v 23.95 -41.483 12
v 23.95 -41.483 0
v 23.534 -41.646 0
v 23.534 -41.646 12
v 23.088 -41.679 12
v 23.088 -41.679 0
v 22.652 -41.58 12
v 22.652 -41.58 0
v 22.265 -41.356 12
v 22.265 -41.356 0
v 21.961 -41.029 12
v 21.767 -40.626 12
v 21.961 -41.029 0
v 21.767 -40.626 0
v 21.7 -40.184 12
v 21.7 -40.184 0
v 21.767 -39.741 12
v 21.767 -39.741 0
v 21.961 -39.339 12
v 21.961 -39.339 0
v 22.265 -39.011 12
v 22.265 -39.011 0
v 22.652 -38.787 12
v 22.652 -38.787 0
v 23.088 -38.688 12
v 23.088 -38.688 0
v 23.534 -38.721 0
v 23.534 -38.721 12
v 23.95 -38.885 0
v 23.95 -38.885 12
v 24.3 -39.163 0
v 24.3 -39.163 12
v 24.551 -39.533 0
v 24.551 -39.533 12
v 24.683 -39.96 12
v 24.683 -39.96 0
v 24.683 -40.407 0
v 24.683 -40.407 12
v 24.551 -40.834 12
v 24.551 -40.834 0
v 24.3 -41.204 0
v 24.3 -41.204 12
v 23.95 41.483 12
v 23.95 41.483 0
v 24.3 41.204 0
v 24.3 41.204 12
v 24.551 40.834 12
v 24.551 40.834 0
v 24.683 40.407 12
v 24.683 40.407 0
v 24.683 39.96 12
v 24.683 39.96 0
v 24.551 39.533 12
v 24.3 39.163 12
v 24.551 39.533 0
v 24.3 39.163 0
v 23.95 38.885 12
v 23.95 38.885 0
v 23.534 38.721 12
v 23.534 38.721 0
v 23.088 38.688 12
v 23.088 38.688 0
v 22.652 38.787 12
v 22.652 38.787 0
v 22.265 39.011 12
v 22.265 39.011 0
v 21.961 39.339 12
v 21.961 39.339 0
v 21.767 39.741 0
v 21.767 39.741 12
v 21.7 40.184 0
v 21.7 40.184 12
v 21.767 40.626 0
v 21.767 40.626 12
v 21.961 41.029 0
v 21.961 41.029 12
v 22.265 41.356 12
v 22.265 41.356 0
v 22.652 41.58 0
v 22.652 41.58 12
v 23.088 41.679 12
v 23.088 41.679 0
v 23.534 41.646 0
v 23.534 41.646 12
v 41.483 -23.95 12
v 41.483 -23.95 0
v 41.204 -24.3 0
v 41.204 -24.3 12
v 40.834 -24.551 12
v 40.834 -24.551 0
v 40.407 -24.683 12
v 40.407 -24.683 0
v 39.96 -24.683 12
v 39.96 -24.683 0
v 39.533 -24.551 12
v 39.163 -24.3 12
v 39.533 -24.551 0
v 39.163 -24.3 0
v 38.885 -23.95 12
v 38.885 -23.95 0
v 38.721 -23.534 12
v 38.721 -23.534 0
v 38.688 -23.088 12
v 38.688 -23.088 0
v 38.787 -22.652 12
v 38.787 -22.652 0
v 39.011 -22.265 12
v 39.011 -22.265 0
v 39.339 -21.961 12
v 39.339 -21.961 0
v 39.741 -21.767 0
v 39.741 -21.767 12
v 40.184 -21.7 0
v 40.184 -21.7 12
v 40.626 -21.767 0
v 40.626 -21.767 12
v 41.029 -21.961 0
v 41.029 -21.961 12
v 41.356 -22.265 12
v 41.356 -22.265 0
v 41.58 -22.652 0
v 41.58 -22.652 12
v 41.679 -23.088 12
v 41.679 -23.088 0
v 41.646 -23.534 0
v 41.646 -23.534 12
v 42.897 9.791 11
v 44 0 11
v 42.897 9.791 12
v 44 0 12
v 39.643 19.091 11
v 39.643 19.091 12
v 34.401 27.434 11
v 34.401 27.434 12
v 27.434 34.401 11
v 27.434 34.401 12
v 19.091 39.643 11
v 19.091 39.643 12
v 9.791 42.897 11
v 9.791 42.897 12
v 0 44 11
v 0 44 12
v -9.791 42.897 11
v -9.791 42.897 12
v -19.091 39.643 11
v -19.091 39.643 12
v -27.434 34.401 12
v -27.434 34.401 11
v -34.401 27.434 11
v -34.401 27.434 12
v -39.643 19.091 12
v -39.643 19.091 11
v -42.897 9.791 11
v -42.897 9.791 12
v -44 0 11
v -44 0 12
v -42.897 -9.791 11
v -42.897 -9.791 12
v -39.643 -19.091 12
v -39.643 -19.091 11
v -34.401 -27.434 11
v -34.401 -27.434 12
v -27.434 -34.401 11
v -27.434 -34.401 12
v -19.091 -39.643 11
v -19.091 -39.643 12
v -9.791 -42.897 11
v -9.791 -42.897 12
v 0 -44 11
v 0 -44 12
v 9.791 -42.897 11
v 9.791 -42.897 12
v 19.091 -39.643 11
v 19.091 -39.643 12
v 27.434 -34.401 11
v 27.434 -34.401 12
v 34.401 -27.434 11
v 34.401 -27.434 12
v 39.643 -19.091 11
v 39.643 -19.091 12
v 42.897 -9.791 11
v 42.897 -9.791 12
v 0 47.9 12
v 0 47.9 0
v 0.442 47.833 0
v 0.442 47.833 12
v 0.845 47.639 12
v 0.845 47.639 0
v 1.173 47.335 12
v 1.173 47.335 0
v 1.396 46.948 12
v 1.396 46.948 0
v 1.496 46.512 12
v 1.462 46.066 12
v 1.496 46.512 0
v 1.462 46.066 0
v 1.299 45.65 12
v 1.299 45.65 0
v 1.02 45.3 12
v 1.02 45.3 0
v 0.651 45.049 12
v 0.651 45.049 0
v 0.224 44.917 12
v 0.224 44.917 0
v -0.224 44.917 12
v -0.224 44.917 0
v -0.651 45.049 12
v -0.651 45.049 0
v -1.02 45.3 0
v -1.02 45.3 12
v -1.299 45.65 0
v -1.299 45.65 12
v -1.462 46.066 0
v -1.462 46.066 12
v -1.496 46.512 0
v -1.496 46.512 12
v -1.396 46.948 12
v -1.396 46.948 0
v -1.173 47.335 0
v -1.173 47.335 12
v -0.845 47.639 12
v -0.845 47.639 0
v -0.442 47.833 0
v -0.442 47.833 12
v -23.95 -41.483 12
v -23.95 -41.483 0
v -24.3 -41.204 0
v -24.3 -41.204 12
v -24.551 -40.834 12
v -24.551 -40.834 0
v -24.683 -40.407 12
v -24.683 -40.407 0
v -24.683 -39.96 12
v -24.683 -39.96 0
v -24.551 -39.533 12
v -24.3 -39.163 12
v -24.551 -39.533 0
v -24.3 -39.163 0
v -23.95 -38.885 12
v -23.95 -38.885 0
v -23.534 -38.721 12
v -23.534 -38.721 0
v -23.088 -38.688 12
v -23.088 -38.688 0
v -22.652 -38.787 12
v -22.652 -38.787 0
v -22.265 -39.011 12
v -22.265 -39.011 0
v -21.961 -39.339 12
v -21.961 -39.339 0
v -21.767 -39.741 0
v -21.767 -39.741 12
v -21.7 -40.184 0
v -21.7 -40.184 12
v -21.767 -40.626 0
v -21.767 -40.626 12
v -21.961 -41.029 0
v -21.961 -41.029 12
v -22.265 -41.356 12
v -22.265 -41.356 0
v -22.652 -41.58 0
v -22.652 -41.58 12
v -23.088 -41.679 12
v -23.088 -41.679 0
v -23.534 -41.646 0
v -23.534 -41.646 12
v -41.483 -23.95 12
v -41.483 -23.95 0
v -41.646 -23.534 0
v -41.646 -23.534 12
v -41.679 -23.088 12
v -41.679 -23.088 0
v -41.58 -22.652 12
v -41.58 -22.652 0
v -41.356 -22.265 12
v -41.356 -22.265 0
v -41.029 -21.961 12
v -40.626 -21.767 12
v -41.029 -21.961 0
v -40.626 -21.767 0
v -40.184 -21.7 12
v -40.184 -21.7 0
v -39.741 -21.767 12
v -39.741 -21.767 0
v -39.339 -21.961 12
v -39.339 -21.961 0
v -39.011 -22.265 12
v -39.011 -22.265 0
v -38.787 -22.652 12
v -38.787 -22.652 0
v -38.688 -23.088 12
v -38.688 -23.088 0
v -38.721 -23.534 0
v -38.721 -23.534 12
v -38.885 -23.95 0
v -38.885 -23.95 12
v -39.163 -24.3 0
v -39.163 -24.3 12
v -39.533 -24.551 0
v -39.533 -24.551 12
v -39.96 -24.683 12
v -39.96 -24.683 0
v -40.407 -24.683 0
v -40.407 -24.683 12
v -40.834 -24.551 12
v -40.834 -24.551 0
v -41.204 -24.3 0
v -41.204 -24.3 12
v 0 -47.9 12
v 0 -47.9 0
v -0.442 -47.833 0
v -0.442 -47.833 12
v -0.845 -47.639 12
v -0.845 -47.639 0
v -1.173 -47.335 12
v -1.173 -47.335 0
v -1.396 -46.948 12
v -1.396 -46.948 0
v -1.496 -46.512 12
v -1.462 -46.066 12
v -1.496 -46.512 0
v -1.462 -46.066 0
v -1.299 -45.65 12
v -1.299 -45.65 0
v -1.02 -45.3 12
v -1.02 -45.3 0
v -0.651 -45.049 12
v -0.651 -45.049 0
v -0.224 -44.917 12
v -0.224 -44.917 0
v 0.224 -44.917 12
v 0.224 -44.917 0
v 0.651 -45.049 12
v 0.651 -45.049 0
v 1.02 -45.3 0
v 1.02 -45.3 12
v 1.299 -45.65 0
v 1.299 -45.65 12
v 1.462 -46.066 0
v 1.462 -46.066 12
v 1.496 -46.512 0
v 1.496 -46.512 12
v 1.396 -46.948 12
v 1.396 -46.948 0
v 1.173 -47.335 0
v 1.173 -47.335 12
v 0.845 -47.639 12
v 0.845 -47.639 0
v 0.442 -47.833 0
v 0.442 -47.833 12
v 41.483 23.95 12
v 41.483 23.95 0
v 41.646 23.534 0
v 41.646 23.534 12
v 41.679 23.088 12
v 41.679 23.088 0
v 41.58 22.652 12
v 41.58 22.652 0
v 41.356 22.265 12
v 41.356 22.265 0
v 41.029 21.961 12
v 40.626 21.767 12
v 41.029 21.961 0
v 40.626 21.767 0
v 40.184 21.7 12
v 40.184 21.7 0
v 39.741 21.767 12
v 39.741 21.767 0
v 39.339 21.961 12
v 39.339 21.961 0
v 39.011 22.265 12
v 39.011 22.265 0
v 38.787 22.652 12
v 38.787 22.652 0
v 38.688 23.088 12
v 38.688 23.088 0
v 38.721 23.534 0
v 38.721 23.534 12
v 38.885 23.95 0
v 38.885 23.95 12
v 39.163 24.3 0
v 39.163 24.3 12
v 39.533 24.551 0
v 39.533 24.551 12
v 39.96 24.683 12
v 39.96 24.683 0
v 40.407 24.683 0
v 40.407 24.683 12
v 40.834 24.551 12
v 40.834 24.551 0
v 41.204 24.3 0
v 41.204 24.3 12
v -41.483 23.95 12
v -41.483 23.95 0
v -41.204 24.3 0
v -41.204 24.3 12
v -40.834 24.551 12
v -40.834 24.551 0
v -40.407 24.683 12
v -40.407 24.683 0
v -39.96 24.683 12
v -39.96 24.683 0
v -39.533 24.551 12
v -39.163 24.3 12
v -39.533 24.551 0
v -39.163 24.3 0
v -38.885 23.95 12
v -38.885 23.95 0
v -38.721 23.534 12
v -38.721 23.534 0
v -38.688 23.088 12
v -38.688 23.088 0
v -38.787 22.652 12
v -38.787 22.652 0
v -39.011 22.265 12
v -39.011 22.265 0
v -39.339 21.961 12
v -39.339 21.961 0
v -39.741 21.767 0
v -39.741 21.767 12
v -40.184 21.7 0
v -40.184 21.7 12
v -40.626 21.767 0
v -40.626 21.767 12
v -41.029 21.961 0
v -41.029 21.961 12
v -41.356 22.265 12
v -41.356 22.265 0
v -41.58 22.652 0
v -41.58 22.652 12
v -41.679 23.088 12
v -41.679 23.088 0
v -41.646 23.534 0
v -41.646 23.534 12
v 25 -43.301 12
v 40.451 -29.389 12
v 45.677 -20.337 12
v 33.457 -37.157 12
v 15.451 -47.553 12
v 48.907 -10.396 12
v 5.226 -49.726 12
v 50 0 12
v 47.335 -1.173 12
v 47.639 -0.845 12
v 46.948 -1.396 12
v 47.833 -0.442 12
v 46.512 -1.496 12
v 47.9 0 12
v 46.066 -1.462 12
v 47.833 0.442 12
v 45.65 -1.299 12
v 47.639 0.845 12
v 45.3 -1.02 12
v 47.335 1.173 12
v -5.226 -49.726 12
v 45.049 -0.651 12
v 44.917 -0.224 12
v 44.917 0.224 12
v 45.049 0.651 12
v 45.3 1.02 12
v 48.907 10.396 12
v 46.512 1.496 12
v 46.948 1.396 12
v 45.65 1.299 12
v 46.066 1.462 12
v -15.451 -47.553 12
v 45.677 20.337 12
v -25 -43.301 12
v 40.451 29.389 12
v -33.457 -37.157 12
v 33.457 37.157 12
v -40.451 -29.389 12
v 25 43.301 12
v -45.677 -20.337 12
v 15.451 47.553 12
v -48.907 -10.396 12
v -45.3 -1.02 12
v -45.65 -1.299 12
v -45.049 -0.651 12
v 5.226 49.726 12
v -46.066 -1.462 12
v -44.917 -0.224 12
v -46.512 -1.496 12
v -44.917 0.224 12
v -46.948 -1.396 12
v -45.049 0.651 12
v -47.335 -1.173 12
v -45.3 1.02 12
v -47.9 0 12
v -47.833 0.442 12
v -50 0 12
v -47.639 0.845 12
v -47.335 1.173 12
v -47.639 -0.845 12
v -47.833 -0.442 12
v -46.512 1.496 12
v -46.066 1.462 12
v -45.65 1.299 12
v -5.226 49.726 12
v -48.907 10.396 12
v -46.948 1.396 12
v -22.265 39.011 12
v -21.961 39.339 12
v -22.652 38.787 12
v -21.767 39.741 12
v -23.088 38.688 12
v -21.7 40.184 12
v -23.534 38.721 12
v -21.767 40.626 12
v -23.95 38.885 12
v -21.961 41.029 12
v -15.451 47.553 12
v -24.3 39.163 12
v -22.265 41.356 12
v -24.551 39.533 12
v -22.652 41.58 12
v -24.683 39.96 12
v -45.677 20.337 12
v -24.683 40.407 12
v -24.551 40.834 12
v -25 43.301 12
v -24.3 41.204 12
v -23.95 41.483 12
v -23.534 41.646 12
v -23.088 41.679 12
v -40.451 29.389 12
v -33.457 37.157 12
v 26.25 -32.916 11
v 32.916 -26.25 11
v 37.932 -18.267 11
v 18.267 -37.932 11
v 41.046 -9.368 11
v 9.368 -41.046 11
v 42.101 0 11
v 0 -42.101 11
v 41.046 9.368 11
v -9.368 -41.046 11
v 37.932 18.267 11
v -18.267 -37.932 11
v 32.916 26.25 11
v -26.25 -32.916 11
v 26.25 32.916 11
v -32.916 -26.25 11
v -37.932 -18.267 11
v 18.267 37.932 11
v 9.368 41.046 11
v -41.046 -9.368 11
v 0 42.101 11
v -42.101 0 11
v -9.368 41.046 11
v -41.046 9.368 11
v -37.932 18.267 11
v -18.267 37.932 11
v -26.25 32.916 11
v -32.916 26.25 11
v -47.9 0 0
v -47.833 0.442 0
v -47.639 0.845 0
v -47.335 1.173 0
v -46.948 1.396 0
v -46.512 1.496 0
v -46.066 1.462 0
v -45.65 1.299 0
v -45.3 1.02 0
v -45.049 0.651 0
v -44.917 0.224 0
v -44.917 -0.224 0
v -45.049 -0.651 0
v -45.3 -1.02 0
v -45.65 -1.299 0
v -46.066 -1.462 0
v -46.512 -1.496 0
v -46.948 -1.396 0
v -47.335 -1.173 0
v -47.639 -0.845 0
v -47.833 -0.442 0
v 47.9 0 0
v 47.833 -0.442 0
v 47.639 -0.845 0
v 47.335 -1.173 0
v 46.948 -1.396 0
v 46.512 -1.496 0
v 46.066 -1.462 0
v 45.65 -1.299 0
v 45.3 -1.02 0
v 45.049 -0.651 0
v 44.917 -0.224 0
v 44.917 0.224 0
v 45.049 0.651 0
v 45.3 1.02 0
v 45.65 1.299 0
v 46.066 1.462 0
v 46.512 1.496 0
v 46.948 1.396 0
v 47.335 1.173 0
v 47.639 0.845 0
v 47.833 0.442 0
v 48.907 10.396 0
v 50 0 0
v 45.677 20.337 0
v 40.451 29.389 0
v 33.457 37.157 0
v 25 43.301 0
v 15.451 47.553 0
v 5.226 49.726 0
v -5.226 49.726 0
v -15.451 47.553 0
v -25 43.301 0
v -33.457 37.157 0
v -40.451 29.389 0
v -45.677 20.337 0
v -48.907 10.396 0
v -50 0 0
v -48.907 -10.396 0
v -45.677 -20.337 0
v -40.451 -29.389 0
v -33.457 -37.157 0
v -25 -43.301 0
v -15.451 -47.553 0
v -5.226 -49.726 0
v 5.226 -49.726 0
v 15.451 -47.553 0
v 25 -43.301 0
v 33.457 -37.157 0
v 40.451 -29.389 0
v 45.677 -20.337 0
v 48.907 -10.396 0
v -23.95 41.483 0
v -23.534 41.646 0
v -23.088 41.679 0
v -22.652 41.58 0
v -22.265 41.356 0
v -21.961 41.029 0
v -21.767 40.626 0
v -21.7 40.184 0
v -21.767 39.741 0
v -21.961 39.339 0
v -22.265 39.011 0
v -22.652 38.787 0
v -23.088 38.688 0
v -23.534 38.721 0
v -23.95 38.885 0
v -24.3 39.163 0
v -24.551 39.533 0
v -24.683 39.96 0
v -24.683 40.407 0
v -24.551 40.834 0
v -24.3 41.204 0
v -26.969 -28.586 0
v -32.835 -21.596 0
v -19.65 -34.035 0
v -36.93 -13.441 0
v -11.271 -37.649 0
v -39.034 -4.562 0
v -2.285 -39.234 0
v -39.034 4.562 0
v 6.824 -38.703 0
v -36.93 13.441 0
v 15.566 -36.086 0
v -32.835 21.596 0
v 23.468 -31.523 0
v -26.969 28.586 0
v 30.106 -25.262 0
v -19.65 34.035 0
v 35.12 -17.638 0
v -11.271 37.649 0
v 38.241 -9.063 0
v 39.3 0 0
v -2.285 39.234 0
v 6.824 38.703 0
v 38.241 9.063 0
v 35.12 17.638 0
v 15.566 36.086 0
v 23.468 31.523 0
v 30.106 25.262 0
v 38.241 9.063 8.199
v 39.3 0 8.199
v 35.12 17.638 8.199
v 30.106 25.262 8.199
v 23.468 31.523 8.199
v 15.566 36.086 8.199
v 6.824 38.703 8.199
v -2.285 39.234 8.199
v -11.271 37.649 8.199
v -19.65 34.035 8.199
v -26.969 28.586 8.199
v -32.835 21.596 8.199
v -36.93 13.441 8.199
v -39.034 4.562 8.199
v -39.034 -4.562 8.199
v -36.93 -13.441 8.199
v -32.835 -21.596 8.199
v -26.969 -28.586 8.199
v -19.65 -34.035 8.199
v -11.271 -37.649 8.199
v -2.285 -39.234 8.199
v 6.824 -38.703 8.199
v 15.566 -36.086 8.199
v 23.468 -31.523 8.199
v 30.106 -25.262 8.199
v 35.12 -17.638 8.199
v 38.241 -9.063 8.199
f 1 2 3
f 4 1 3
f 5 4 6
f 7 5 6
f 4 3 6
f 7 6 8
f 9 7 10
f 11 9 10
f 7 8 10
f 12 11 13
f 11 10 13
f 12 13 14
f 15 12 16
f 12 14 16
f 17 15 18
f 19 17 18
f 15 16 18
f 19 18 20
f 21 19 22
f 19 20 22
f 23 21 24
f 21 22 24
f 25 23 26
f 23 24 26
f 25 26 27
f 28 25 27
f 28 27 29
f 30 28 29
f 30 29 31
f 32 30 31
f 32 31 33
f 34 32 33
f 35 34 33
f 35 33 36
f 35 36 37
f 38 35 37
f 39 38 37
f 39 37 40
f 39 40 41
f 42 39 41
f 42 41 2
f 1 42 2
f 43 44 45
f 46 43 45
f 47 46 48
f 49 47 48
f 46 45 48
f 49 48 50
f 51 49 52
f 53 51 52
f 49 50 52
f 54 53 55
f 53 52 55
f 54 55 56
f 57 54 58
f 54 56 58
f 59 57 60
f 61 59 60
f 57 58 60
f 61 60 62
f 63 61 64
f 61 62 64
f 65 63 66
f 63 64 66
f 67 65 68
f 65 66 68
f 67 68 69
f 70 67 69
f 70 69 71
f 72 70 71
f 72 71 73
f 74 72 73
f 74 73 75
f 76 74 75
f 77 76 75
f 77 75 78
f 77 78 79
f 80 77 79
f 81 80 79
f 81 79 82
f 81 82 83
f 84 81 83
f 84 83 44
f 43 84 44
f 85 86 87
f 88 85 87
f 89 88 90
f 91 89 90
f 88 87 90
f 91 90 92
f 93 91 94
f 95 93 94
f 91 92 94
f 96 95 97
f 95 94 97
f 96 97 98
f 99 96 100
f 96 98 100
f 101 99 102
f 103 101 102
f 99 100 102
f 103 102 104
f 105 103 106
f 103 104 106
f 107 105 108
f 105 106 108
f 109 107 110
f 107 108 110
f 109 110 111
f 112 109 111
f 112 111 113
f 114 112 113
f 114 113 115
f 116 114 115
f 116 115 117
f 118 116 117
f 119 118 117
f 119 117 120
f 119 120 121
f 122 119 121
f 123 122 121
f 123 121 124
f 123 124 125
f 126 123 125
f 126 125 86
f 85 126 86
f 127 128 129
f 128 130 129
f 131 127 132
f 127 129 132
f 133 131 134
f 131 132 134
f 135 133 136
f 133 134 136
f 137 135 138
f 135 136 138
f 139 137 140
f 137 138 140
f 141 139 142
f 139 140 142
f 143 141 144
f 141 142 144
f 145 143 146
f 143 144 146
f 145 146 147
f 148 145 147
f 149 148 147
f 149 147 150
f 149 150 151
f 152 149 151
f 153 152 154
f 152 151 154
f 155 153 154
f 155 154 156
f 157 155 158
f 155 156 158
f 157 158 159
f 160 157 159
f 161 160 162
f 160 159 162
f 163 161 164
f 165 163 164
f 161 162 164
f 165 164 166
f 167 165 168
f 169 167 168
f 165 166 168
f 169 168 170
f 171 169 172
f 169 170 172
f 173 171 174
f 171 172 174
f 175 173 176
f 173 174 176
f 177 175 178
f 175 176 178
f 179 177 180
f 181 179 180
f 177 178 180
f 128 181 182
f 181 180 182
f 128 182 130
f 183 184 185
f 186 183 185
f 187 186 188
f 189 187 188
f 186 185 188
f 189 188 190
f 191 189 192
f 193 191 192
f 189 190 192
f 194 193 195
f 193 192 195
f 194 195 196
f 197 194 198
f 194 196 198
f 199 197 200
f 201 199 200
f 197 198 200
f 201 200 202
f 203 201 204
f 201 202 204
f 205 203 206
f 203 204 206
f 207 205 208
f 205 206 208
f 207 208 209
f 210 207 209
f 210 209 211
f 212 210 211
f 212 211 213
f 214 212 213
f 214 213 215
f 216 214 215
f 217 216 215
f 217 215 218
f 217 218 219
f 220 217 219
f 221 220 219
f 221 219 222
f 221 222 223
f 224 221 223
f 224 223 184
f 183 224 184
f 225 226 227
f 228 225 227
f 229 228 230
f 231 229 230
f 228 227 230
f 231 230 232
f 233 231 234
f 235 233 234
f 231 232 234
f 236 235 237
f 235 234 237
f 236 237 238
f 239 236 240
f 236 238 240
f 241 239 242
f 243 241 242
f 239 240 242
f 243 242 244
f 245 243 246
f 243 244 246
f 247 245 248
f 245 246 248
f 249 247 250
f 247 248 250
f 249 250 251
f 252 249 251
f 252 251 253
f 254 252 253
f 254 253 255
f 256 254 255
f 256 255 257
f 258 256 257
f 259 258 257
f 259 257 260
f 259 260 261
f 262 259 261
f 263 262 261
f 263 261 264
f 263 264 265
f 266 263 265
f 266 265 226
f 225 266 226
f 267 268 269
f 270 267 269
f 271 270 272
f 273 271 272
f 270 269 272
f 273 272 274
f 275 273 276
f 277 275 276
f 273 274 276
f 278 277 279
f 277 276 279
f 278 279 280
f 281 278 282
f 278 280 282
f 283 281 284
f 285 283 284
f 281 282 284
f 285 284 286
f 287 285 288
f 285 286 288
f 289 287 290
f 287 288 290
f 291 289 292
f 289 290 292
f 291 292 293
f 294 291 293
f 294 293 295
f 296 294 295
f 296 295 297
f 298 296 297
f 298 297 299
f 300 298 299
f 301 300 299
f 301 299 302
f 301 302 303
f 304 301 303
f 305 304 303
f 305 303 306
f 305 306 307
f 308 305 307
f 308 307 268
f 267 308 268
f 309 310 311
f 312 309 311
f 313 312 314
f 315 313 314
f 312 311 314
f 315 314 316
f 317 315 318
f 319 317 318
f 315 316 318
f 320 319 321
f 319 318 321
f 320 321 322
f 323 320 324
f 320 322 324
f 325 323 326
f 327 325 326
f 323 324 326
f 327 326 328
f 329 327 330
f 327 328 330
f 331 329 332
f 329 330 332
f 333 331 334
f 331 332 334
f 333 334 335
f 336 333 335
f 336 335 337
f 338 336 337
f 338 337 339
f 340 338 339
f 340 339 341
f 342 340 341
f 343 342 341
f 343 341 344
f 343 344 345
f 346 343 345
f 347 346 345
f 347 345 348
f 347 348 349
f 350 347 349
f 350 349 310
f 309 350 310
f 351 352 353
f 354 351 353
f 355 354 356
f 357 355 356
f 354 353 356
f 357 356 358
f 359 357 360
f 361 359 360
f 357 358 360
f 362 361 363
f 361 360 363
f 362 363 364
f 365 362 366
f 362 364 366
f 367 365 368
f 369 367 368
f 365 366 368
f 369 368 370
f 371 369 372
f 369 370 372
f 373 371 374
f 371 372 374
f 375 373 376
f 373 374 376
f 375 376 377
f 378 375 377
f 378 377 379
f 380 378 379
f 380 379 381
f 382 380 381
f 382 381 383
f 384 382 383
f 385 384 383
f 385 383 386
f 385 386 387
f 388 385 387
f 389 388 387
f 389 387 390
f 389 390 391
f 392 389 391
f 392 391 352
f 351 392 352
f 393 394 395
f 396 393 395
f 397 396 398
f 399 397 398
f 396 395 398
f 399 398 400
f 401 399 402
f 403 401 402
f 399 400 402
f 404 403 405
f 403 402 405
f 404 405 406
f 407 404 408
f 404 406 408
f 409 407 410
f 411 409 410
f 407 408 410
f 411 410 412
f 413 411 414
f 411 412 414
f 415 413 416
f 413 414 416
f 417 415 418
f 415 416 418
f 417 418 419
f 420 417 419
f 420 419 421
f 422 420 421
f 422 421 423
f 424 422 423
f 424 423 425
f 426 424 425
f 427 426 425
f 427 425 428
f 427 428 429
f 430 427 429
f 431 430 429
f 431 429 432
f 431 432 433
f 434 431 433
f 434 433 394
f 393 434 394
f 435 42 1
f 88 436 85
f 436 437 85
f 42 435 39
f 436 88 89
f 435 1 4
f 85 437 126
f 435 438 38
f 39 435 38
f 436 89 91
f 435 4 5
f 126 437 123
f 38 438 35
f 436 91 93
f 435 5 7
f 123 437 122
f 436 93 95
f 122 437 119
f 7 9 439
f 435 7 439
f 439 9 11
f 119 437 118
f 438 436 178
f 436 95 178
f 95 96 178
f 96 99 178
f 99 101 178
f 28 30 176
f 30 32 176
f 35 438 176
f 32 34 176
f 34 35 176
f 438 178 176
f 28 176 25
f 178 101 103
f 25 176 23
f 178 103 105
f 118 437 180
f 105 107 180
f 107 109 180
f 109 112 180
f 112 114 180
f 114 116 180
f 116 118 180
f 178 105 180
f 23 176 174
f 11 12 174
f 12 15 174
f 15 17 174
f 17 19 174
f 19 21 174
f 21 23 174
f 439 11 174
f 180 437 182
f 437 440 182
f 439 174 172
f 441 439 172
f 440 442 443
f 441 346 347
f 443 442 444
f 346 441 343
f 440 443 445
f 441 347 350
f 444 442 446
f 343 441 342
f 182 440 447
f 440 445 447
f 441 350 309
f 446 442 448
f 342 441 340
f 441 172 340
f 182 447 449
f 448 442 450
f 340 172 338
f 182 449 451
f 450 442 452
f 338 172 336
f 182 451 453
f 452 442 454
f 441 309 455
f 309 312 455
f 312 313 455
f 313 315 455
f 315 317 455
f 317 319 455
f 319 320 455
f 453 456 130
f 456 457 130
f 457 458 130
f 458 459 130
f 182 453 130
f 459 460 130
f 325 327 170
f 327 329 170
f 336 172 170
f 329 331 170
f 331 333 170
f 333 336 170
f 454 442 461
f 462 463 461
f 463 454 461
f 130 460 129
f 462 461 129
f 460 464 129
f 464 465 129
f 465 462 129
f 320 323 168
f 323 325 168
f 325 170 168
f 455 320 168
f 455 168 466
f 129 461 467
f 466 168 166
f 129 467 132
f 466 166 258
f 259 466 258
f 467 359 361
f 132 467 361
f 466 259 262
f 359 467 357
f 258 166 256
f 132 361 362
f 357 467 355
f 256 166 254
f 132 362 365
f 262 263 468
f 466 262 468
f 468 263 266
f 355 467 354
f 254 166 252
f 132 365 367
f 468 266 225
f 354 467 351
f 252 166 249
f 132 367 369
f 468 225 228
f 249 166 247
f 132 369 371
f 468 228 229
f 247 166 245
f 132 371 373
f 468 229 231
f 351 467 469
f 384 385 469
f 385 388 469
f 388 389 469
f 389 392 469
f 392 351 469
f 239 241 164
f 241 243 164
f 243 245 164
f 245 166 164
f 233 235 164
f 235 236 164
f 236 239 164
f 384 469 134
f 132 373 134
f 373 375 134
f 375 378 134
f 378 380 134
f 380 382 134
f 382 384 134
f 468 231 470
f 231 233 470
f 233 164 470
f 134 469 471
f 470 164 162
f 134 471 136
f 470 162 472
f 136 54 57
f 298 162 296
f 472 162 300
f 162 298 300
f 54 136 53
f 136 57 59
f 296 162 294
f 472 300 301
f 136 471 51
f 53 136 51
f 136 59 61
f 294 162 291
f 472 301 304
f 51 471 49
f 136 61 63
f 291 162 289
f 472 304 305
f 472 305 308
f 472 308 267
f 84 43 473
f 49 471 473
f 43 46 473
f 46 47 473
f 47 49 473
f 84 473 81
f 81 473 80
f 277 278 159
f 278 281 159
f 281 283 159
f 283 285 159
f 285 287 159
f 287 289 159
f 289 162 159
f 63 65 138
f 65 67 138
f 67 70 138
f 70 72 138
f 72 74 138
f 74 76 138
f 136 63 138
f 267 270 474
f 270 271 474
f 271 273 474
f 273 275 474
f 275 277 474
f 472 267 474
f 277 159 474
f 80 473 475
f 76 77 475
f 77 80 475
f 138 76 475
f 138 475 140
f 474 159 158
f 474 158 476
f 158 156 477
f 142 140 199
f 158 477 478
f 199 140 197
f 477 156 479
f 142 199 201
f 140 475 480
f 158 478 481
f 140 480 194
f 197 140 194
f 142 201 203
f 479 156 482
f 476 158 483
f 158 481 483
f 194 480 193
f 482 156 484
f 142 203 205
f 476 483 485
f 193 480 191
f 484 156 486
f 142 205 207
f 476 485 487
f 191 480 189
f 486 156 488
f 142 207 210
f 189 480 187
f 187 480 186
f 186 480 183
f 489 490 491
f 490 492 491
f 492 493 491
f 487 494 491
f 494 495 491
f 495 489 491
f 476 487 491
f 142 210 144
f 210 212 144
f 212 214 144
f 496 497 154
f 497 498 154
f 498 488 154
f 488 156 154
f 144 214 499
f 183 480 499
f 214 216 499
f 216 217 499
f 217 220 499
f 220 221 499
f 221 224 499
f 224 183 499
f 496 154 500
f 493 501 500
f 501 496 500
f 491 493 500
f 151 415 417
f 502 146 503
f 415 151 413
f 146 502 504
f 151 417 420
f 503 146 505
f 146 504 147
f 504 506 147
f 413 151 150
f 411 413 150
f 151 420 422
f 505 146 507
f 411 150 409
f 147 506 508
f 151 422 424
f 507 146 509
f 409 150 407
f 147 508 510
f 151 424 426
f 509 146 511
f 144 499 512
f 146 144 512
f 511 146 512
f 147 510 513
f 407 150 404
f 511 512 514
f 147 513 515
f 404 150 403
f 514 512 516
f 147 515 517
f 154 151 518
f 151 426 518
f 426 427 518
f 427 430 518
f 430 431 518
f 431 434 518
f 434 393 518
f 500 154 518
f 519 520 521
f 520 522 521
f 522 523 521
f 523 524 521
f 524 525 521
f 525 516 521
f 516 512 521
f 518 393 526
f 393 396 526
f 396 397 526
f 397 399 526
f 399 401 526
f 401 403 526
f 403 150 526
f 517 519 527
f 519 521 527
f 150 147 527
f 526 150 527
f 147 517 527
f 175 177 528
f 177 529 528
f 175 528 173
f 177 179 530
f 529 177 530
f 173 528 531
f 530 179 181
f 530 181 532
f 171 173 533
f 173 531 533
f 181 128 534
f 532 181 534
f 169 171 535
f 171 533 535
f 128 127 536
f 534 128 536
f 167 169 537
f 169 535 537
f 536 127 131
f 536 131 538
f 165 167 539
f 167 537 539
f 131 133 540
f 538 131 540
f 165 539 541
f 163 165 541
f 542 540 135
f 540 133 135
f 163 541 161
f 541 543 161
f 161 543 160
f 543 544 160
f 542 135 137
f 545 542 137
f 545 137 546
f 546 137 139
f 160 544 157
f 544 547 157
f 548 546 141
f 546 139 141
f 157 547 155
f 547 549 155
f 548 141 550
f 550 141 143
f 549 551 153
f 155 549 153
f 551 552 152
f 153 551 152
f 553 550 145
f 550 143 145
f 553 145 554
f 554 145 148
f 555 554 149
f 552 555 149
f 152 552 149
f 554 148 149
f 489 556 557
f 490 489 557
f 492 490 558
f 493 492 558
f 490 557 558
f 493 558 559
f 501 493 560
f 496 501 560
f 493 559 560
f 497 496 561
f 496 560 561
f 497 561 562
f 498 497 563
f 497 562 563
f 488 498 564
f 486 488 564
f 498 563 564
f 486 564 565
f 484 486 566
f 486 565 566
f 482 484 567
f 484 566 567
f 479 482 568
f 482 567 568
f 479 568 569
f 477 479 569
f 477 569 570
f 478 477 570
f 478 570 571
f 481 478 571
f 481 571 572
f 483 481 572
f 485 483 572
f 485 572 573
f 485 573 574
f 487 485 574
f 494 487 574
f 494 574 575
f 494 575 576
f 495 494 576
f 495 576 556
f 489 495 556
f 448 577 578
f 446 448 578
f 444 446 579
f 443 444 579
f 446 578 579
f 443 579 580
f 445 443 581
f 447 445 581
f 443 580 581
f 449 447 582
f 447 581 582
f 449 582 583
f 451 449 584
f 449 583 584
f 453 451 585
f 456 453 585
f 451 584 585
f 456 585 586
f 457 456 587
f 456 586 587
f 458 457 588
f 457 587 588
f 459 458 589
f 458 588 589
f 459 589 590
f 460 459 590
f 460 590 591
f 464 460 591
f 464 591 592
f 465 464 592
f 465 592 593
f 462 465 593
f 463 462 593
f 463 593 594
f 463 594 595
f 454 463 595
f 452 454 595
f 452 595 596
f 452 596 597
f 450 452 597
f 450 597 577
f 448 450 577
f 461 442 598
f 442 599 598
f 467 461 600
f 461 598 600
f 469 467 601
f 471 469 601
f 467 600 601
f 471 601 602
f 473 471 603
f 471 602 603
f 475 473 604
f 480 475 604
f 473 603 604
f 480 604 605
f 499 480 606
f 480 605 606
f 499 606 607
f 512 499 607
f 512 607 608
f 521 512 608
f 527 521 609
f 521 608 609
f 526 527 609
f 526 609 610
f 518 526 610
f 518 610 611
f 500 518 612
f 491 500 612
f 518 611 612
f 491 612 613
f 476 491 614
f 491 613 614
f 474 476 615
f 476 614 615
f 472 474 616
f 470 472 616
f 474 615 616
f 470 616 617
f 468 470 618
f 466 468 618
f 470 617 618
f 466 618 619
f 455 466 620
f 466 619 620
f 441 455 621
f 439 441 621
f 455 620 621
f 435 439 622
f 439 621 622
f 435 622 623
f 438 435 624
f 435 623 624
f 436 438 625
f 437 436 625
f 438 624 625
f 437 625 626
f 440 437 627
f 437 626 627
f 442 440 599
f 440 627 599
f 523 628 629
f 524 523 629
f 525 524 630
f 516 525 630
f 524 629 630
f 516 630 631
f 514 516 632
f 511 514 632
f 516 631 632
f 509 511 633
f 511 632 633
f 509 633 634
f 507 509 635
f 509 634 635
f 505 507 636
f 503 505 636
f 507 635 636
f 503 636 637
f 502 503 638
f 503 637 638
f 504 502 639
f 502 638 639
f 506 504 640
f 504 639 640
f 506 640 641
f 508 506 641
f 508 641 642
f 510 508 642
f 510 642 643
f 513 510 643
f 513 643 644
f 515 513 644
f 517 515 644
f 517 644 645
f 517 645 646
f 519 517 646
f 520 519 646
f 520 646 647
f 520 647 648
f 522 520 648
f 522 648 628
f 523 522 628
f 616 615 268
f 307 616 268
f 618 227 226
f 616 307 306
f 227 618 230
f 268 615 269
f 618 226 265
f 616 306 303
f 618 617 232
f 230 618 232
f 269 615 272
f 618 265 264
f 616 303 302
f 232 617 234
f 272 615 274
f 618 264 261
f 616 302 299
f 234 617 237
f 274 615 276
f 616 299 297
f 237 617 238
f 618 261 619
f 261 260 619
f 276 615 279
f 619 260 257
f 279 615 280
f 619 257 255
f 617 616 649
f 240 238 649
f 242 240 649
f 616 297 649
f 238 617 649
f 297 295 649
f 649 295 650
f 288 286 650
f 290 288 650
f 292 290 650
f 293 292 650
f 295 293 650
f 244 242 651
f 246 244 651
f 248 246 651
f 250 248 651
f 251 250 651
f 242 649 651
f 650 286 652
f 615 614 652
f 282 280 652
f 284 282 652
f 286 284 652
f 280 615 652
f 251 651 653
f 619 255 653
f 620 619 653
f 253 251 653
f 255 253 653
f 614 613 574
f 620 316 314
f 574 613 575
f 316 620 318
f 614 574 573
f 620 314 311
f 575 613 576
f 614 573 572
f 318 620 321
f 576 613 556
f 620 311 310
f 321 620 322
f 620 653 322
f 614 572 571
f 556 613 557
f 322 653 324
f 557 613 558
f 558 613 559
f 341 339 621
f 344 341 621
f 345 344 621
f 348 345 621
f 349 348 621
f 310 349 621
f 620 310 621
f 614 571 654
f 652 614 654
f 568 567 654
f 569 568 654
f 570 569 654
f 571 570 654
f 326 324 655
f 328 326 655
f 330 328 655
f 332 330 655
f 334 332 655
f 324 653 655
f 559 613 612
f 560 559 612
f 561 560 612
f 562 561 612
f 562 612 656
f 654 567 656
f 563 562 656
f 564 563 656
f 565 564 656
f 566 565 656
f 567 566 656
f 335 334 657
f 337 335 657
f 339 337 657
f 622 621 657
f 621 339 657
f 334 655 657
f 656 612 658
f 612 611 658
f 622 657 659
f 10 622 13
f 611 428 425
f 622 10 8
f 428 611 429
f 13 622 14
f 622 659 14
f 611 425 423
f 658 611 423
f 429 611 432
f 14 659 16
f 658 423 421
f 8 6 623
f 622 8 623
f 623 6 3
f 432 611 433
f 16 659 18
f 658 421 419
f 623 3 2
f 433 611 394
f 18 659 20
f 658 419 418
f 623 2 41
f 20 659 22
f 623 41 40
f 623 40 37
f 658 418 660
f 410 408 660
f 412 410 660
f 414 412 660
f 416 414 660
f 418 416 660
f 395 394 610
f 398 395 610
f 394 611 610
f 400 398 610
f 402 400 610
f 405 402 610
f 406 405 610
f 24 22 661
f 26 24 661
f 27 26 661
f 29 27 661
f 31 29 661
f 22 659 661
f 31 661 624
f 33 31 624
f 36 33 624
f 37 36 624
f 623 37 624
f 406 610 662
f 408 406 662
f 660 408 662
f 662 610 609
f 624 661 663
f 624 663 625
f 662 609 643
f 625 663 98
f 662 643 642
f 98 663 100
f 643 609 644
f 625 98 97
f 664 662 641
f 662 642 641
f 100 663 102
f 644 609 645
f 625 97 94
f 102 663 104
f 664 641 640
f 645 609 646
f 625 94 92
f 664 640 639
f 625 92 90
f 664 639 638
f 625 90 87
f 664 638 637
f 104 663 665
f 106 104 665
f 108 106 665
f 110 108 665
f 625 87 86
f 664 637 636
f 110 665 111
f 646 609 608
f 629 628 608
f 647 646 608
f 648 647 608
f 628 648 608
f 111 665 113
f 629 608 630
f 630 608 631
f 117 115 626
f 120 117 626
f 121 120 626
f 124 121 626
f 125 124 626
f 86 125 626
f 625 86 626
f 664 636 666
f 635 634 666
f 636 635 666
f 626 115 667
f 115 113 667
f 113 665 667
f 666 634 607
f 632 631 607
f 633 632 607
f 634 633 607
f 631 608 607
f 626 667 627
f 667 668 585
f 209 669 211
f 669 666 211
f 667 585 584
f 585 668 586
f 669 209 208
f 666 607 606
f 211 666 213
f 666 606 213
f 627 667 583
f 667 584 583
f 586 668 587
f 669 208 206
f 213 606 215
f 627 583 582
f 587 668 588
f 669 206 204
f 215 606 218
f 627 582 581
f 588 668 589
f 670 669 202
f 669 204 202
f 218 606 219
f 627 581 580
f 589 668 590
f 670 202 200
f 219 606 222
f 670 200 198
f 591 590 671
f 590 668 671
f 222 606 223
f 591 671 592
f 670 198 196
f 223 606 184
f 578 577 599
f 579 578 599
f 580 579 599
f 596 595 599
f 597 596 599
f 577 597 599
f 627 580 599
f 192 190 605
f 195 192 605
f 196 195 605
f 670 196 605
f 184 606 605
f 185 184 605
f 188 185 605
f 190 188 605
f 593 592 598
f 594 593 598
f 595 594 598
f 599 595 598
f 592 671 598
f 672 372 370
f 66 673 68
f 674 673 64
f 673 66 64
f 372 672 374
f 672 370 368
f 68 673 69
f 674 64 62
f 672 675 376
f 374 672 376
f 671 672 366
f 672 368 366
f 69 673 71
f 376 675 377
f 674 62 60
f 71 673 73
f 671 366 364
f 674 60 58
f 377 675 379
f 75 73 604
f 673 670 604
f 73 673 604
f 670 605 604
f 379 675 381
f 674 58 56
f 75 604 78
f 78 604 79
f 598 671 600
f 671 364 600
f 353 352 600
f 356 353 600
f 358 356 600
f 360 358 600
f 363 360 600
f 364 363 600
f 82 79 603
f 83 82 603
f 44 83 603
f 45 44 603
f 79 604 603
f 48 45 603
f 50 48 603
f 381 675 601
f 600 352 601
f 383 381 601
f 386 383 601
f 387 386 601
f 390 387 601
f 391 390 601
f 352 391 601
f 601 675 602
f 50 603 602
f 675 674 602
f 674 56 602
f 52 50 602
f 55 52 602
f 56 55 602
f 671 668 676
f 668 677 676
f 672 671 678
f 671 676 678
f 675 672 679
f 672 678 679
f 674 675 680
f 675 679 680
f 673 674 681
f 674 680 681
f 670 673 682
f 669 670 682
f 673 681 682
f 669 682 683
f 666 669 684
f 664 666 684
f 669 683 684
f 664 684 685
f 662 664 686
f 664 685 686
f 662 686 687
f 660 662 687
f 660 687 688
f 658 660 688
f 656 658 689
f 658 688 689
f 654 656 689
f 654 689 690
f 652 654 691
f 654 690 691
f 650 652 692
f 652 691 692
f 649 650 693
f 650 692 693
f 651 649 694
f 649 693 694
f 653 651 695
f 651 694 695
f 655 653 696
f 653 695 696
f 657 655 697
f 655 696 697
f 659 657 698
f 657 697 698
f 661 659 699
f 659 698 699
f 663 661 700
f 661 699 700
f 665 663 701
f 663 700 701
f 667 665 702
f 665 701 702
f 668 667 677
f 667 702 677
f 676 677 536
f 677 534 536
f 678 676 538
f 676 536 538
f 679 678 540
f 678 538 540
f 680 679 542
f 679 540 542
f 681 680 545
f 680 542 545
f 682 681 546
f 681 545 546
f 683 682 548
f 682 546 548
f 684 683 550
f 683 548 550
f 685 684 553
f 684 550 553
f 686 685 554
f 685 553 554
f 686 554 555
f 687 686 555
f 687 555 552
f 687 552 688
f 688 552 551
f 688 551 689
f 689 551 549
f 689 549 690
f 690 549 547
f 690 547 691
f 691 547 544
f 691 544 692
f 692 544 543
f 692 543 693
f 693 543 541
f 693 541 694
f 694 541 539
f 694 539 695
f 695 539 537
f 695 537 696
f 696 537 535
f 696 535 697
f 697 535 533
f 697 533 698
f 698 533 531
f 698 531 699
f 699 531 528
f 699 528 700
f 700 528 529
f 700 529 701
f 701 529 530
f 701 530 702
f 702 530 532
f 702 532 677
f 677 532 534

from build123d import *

# Parameters (mm, degrees)
SKETCH_R           = 1.5
POCKET_DEPTH       = 295.86012
POLARPATTERN_COUNT = 12


with BuildPart() as part:
    # Sketch013 → Revolution (revolve)
    with BuildSketch(Plane.XZ):
        Polygon((39.3, 0), (39.3, 8.198781), (42.101219, 11), (44, 11), (44, 12), (50, 12), (50, 0), align=None)
    revolve(axis=Axis((0, 0, 0), (0, 0, 1)))

    # Sketch → Pocket (cut, through all)
    with BuildSketch(Plane(origin=(0, 0, 0), x_dir=(1, 0, 0), z_dir=(0, 0, -1))):
        with Locations((46.4, 0)):
            Circle(SKETCH_R)
    pocket = extrude(amount=-POCKET_DEPTH, mode=Mode.SUBTRACT)

    # PolarPattern: Pocket ×12 about axis
    polarpattern_axis = Axis((0, 0, 0), (0, 0, -1))
    for i in range(1, POLARPATTERN_COUNT):
        add(pocket.rotate(polarpattern_axis, i * 360 / POLARPATTERN_COUNT), mode=Mode.SUBTRACT)


solid = part.part
